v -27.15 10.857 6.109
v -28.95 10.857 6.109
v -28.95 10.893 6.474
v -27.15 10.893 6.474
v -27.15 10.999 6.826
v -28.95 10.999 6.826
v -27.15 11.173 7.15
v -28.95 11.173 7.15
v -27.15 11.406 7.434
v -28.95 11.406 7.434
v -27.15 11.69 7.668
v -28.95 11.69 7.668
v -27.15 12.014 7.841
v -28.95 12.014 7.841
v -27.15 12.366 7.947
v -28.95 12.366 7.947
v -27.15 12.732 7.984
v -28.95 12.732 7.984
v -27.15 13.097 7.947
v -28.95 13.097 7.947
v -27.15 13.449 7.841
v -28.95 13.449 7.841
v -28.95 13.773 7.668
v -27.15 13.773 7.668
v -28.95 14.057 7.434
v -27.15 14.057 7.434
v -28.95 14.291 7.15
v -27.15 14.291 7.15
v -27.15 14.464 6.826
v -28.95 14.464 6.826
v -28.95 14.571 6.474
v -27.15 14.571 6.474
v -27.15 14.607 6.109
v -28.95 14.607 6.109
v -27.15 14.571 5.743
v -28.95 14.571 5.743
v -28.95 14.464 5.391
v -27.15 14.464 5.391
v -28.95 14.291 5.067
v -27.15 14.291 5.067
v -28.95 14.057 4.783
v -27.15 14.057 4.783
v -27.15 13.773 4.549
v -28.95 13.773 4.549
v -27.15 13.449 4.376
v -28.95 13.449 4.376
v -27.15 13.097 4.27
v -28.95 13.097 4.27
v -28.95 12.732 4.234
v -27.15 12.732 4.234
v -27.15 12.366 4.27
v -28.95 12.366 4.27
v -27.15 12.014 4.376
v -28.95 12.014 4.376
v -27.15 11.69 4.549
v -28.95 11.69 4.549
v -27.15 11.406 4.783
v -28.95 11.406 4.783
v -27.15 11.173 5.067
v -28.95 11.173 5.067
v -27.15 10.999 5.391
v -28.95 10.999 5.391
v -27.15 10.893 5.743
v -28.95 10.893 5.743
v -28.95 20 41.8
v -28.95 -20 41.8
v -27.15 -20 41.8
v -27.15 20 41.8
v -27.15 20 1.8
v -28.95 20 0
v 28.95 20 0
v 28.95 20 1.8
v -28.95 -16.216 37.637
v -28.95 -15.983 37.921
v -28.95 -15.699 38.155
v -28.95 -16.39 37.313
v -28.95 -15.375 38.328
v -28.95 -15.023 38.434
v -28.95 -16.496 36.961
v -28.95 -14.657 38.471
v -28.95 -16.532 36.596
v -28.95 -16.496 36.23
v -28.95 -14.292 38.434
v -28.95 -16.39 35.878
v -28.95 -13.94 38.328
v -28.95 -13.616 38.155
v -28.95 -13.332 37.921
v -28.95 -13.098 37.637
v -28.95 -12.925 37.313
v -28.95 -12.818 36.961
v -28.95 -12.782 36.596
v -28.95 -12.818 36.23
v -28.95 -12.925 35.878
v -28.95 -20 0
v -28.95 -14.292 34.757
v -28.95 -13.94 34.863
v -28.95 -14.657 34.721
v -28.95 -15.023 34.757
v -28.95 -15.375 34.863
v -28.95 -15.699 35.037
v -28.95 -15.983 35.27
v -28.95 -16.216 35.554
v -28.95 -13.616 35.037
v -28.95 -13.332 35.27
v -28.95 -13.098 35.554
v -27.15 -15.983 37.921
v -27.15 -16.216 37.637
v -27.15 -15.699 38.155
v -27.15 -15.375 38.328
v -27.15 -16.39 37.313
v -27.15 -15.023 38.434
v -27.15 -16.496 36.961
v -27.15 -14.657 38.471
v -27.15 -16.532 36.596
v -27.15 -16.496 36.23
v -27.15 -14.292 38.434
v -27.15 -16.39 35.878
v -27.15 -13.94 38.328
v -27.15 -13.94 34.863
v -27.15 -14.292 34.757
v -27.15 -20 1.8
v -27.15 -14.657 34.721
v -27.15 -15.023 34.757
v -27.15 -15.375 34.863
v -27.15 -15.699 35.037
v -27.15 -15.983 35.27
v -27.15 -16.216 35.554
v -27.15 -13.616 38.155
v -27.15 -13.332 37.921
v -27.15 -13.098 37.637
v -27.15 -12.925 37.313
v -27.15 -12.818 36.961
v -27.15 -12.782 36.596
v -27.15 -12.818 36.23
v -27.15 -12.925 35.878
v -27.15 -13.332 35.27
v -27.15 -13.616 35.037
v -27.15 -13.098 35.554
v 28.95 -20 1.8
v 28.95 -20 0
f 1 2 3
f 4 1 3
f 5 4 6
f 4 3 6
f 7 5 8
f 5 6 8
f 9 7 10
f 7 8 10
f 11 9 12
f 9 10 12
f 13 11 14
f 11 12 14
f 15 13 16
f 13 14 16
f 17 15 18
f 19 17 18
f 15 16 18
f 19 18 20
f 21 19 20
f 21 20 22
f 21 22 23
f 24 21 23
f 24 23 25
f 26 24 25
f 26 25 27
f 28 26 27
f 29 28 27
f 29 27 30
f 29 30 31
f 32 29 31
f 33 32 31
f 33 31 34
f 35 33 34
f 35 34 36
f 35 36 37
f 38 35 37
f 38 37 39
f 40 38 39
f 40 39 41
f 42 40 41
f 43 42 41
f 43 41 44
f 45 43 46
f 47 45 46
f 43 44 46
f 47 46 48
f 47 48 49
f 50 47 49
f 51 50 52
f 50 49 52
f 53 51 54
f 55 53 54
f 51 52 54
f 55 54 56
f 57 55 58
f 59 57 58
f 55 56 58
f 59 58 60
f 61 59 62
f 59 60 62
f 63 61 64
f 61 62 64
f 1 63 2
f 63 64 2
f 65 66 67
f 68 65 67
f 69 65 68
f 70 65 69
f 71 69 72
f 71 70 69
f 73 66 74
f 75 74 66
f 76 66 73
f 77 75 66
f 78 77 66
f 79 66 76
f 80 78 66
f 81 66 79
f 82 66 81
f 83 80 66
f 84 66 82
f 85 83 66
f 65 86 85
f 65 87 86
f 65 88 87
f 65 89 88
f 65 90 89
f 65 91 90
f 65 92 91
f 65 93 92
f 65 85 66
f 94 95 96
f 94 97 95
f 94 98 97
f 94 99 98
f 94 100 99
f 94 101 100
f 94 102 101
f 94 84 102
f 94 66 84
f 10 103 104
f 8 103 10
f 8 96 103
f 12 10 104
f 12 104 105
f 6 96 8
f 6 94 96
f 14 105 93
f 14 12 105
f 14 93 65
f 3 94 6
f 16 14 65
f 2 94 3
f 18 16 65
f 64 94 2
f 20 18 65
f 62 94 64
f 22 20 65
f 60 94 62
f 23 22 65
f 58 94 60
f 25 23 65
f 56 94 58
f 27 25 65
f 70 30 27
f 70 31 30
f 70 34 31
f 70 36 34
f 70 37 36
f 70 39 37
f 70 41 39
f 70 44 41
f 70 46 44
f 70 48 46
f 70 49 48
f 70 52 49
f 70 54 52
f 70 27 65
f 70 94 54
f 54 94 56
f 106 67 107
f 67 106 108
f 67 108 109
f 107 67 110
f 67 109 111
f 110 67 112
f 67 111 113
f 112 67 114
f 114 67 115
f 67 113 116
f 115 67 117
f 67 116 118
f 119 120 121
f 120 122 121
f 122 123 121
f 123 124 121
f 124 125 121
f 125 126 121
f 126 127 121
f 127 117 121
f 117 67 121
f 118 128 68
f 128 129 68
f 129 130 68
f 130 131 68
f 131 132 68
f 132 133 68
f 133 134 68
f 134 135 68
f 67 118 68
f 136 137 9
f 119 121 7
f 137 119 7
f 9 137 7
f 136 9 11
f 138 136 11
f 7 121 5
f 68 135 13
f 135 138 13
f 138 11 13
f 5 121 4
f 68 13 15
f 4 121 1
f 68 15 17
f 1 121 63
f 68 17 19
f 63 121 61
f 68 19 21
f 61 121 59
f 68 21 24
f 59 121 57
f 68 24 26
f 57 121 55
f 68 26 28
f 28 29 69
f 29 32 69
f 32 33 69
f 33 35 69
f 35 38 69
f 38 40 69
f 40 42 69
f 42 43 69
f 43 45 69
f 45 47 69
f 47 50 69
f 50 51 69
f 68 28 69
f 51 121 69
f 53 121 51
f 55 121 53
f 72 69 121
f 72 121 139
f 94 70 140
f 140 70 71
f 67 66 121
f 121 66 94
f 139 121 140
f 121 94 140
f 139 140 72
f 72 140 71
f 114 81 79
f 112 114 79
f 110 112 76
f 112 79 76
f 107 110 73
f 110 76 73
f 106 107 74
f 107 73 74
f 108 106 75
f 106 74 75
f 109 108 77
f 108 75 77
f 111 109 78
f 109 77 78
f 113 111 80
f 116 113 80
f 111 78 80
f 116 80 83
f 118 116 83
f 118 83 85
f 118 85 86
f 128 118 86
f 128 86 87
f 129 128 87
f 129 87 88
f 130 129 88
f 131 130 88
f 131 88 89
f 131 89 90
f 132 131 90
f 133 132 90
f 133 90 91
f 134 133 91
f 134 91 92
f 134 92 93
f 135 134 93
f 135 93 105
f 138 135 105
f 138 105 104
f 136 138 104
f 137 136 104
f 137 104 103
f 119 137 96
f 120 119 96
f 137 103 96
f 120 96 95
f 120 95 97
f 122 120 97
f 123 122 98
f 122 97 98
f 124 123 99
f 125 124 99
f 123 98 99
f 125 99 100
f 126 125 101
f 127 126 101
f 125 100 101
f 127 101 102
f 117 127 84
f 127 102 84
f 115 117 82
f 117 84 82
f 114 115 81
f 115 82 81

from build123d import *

# Parameters (mm, degrees)
F0_W     = 57.90056
F0_H     = 40
F1_DEPTH = 1.8
F2_W     = 1.8
F2_H     = 40
F3_DEPTH = 40
F4_R     = 1.875
F5_DEPTH = 9.2


with BuildPart() as f1:
    # F0 (on Top) → F1 (new body)
    with BuildSketch(Plane.XY):
        Rectangle(F0_W, F0_H)
    extrude(amount=F1_DEPTH)

    # F2 (on face) → F3 (join)
    with BuildSketch(Plane.XY.offset(1.8)):
        with Locations((-28.05028, 0)):
            Rectangle(F2_W, F2_H)
    extrude(amount=F3_DEPTH)

    # F4 (on face) → F5 (cut)
    with BuildSketch(Plane(origin=(-28.95028, 0, 0), x_dir=(0, -1, 0), z_dir=(-1, 0, 0))):
        with Locations((14.657458, 36.595527)):
            Circle(F4_R)
        with Locations((-12.731545, 6.108502)):
            Circle(F4_R)
    extrude(amount=-F5_DEPTH, mode=Mode.SUBTRACT)


solid = f1.part
